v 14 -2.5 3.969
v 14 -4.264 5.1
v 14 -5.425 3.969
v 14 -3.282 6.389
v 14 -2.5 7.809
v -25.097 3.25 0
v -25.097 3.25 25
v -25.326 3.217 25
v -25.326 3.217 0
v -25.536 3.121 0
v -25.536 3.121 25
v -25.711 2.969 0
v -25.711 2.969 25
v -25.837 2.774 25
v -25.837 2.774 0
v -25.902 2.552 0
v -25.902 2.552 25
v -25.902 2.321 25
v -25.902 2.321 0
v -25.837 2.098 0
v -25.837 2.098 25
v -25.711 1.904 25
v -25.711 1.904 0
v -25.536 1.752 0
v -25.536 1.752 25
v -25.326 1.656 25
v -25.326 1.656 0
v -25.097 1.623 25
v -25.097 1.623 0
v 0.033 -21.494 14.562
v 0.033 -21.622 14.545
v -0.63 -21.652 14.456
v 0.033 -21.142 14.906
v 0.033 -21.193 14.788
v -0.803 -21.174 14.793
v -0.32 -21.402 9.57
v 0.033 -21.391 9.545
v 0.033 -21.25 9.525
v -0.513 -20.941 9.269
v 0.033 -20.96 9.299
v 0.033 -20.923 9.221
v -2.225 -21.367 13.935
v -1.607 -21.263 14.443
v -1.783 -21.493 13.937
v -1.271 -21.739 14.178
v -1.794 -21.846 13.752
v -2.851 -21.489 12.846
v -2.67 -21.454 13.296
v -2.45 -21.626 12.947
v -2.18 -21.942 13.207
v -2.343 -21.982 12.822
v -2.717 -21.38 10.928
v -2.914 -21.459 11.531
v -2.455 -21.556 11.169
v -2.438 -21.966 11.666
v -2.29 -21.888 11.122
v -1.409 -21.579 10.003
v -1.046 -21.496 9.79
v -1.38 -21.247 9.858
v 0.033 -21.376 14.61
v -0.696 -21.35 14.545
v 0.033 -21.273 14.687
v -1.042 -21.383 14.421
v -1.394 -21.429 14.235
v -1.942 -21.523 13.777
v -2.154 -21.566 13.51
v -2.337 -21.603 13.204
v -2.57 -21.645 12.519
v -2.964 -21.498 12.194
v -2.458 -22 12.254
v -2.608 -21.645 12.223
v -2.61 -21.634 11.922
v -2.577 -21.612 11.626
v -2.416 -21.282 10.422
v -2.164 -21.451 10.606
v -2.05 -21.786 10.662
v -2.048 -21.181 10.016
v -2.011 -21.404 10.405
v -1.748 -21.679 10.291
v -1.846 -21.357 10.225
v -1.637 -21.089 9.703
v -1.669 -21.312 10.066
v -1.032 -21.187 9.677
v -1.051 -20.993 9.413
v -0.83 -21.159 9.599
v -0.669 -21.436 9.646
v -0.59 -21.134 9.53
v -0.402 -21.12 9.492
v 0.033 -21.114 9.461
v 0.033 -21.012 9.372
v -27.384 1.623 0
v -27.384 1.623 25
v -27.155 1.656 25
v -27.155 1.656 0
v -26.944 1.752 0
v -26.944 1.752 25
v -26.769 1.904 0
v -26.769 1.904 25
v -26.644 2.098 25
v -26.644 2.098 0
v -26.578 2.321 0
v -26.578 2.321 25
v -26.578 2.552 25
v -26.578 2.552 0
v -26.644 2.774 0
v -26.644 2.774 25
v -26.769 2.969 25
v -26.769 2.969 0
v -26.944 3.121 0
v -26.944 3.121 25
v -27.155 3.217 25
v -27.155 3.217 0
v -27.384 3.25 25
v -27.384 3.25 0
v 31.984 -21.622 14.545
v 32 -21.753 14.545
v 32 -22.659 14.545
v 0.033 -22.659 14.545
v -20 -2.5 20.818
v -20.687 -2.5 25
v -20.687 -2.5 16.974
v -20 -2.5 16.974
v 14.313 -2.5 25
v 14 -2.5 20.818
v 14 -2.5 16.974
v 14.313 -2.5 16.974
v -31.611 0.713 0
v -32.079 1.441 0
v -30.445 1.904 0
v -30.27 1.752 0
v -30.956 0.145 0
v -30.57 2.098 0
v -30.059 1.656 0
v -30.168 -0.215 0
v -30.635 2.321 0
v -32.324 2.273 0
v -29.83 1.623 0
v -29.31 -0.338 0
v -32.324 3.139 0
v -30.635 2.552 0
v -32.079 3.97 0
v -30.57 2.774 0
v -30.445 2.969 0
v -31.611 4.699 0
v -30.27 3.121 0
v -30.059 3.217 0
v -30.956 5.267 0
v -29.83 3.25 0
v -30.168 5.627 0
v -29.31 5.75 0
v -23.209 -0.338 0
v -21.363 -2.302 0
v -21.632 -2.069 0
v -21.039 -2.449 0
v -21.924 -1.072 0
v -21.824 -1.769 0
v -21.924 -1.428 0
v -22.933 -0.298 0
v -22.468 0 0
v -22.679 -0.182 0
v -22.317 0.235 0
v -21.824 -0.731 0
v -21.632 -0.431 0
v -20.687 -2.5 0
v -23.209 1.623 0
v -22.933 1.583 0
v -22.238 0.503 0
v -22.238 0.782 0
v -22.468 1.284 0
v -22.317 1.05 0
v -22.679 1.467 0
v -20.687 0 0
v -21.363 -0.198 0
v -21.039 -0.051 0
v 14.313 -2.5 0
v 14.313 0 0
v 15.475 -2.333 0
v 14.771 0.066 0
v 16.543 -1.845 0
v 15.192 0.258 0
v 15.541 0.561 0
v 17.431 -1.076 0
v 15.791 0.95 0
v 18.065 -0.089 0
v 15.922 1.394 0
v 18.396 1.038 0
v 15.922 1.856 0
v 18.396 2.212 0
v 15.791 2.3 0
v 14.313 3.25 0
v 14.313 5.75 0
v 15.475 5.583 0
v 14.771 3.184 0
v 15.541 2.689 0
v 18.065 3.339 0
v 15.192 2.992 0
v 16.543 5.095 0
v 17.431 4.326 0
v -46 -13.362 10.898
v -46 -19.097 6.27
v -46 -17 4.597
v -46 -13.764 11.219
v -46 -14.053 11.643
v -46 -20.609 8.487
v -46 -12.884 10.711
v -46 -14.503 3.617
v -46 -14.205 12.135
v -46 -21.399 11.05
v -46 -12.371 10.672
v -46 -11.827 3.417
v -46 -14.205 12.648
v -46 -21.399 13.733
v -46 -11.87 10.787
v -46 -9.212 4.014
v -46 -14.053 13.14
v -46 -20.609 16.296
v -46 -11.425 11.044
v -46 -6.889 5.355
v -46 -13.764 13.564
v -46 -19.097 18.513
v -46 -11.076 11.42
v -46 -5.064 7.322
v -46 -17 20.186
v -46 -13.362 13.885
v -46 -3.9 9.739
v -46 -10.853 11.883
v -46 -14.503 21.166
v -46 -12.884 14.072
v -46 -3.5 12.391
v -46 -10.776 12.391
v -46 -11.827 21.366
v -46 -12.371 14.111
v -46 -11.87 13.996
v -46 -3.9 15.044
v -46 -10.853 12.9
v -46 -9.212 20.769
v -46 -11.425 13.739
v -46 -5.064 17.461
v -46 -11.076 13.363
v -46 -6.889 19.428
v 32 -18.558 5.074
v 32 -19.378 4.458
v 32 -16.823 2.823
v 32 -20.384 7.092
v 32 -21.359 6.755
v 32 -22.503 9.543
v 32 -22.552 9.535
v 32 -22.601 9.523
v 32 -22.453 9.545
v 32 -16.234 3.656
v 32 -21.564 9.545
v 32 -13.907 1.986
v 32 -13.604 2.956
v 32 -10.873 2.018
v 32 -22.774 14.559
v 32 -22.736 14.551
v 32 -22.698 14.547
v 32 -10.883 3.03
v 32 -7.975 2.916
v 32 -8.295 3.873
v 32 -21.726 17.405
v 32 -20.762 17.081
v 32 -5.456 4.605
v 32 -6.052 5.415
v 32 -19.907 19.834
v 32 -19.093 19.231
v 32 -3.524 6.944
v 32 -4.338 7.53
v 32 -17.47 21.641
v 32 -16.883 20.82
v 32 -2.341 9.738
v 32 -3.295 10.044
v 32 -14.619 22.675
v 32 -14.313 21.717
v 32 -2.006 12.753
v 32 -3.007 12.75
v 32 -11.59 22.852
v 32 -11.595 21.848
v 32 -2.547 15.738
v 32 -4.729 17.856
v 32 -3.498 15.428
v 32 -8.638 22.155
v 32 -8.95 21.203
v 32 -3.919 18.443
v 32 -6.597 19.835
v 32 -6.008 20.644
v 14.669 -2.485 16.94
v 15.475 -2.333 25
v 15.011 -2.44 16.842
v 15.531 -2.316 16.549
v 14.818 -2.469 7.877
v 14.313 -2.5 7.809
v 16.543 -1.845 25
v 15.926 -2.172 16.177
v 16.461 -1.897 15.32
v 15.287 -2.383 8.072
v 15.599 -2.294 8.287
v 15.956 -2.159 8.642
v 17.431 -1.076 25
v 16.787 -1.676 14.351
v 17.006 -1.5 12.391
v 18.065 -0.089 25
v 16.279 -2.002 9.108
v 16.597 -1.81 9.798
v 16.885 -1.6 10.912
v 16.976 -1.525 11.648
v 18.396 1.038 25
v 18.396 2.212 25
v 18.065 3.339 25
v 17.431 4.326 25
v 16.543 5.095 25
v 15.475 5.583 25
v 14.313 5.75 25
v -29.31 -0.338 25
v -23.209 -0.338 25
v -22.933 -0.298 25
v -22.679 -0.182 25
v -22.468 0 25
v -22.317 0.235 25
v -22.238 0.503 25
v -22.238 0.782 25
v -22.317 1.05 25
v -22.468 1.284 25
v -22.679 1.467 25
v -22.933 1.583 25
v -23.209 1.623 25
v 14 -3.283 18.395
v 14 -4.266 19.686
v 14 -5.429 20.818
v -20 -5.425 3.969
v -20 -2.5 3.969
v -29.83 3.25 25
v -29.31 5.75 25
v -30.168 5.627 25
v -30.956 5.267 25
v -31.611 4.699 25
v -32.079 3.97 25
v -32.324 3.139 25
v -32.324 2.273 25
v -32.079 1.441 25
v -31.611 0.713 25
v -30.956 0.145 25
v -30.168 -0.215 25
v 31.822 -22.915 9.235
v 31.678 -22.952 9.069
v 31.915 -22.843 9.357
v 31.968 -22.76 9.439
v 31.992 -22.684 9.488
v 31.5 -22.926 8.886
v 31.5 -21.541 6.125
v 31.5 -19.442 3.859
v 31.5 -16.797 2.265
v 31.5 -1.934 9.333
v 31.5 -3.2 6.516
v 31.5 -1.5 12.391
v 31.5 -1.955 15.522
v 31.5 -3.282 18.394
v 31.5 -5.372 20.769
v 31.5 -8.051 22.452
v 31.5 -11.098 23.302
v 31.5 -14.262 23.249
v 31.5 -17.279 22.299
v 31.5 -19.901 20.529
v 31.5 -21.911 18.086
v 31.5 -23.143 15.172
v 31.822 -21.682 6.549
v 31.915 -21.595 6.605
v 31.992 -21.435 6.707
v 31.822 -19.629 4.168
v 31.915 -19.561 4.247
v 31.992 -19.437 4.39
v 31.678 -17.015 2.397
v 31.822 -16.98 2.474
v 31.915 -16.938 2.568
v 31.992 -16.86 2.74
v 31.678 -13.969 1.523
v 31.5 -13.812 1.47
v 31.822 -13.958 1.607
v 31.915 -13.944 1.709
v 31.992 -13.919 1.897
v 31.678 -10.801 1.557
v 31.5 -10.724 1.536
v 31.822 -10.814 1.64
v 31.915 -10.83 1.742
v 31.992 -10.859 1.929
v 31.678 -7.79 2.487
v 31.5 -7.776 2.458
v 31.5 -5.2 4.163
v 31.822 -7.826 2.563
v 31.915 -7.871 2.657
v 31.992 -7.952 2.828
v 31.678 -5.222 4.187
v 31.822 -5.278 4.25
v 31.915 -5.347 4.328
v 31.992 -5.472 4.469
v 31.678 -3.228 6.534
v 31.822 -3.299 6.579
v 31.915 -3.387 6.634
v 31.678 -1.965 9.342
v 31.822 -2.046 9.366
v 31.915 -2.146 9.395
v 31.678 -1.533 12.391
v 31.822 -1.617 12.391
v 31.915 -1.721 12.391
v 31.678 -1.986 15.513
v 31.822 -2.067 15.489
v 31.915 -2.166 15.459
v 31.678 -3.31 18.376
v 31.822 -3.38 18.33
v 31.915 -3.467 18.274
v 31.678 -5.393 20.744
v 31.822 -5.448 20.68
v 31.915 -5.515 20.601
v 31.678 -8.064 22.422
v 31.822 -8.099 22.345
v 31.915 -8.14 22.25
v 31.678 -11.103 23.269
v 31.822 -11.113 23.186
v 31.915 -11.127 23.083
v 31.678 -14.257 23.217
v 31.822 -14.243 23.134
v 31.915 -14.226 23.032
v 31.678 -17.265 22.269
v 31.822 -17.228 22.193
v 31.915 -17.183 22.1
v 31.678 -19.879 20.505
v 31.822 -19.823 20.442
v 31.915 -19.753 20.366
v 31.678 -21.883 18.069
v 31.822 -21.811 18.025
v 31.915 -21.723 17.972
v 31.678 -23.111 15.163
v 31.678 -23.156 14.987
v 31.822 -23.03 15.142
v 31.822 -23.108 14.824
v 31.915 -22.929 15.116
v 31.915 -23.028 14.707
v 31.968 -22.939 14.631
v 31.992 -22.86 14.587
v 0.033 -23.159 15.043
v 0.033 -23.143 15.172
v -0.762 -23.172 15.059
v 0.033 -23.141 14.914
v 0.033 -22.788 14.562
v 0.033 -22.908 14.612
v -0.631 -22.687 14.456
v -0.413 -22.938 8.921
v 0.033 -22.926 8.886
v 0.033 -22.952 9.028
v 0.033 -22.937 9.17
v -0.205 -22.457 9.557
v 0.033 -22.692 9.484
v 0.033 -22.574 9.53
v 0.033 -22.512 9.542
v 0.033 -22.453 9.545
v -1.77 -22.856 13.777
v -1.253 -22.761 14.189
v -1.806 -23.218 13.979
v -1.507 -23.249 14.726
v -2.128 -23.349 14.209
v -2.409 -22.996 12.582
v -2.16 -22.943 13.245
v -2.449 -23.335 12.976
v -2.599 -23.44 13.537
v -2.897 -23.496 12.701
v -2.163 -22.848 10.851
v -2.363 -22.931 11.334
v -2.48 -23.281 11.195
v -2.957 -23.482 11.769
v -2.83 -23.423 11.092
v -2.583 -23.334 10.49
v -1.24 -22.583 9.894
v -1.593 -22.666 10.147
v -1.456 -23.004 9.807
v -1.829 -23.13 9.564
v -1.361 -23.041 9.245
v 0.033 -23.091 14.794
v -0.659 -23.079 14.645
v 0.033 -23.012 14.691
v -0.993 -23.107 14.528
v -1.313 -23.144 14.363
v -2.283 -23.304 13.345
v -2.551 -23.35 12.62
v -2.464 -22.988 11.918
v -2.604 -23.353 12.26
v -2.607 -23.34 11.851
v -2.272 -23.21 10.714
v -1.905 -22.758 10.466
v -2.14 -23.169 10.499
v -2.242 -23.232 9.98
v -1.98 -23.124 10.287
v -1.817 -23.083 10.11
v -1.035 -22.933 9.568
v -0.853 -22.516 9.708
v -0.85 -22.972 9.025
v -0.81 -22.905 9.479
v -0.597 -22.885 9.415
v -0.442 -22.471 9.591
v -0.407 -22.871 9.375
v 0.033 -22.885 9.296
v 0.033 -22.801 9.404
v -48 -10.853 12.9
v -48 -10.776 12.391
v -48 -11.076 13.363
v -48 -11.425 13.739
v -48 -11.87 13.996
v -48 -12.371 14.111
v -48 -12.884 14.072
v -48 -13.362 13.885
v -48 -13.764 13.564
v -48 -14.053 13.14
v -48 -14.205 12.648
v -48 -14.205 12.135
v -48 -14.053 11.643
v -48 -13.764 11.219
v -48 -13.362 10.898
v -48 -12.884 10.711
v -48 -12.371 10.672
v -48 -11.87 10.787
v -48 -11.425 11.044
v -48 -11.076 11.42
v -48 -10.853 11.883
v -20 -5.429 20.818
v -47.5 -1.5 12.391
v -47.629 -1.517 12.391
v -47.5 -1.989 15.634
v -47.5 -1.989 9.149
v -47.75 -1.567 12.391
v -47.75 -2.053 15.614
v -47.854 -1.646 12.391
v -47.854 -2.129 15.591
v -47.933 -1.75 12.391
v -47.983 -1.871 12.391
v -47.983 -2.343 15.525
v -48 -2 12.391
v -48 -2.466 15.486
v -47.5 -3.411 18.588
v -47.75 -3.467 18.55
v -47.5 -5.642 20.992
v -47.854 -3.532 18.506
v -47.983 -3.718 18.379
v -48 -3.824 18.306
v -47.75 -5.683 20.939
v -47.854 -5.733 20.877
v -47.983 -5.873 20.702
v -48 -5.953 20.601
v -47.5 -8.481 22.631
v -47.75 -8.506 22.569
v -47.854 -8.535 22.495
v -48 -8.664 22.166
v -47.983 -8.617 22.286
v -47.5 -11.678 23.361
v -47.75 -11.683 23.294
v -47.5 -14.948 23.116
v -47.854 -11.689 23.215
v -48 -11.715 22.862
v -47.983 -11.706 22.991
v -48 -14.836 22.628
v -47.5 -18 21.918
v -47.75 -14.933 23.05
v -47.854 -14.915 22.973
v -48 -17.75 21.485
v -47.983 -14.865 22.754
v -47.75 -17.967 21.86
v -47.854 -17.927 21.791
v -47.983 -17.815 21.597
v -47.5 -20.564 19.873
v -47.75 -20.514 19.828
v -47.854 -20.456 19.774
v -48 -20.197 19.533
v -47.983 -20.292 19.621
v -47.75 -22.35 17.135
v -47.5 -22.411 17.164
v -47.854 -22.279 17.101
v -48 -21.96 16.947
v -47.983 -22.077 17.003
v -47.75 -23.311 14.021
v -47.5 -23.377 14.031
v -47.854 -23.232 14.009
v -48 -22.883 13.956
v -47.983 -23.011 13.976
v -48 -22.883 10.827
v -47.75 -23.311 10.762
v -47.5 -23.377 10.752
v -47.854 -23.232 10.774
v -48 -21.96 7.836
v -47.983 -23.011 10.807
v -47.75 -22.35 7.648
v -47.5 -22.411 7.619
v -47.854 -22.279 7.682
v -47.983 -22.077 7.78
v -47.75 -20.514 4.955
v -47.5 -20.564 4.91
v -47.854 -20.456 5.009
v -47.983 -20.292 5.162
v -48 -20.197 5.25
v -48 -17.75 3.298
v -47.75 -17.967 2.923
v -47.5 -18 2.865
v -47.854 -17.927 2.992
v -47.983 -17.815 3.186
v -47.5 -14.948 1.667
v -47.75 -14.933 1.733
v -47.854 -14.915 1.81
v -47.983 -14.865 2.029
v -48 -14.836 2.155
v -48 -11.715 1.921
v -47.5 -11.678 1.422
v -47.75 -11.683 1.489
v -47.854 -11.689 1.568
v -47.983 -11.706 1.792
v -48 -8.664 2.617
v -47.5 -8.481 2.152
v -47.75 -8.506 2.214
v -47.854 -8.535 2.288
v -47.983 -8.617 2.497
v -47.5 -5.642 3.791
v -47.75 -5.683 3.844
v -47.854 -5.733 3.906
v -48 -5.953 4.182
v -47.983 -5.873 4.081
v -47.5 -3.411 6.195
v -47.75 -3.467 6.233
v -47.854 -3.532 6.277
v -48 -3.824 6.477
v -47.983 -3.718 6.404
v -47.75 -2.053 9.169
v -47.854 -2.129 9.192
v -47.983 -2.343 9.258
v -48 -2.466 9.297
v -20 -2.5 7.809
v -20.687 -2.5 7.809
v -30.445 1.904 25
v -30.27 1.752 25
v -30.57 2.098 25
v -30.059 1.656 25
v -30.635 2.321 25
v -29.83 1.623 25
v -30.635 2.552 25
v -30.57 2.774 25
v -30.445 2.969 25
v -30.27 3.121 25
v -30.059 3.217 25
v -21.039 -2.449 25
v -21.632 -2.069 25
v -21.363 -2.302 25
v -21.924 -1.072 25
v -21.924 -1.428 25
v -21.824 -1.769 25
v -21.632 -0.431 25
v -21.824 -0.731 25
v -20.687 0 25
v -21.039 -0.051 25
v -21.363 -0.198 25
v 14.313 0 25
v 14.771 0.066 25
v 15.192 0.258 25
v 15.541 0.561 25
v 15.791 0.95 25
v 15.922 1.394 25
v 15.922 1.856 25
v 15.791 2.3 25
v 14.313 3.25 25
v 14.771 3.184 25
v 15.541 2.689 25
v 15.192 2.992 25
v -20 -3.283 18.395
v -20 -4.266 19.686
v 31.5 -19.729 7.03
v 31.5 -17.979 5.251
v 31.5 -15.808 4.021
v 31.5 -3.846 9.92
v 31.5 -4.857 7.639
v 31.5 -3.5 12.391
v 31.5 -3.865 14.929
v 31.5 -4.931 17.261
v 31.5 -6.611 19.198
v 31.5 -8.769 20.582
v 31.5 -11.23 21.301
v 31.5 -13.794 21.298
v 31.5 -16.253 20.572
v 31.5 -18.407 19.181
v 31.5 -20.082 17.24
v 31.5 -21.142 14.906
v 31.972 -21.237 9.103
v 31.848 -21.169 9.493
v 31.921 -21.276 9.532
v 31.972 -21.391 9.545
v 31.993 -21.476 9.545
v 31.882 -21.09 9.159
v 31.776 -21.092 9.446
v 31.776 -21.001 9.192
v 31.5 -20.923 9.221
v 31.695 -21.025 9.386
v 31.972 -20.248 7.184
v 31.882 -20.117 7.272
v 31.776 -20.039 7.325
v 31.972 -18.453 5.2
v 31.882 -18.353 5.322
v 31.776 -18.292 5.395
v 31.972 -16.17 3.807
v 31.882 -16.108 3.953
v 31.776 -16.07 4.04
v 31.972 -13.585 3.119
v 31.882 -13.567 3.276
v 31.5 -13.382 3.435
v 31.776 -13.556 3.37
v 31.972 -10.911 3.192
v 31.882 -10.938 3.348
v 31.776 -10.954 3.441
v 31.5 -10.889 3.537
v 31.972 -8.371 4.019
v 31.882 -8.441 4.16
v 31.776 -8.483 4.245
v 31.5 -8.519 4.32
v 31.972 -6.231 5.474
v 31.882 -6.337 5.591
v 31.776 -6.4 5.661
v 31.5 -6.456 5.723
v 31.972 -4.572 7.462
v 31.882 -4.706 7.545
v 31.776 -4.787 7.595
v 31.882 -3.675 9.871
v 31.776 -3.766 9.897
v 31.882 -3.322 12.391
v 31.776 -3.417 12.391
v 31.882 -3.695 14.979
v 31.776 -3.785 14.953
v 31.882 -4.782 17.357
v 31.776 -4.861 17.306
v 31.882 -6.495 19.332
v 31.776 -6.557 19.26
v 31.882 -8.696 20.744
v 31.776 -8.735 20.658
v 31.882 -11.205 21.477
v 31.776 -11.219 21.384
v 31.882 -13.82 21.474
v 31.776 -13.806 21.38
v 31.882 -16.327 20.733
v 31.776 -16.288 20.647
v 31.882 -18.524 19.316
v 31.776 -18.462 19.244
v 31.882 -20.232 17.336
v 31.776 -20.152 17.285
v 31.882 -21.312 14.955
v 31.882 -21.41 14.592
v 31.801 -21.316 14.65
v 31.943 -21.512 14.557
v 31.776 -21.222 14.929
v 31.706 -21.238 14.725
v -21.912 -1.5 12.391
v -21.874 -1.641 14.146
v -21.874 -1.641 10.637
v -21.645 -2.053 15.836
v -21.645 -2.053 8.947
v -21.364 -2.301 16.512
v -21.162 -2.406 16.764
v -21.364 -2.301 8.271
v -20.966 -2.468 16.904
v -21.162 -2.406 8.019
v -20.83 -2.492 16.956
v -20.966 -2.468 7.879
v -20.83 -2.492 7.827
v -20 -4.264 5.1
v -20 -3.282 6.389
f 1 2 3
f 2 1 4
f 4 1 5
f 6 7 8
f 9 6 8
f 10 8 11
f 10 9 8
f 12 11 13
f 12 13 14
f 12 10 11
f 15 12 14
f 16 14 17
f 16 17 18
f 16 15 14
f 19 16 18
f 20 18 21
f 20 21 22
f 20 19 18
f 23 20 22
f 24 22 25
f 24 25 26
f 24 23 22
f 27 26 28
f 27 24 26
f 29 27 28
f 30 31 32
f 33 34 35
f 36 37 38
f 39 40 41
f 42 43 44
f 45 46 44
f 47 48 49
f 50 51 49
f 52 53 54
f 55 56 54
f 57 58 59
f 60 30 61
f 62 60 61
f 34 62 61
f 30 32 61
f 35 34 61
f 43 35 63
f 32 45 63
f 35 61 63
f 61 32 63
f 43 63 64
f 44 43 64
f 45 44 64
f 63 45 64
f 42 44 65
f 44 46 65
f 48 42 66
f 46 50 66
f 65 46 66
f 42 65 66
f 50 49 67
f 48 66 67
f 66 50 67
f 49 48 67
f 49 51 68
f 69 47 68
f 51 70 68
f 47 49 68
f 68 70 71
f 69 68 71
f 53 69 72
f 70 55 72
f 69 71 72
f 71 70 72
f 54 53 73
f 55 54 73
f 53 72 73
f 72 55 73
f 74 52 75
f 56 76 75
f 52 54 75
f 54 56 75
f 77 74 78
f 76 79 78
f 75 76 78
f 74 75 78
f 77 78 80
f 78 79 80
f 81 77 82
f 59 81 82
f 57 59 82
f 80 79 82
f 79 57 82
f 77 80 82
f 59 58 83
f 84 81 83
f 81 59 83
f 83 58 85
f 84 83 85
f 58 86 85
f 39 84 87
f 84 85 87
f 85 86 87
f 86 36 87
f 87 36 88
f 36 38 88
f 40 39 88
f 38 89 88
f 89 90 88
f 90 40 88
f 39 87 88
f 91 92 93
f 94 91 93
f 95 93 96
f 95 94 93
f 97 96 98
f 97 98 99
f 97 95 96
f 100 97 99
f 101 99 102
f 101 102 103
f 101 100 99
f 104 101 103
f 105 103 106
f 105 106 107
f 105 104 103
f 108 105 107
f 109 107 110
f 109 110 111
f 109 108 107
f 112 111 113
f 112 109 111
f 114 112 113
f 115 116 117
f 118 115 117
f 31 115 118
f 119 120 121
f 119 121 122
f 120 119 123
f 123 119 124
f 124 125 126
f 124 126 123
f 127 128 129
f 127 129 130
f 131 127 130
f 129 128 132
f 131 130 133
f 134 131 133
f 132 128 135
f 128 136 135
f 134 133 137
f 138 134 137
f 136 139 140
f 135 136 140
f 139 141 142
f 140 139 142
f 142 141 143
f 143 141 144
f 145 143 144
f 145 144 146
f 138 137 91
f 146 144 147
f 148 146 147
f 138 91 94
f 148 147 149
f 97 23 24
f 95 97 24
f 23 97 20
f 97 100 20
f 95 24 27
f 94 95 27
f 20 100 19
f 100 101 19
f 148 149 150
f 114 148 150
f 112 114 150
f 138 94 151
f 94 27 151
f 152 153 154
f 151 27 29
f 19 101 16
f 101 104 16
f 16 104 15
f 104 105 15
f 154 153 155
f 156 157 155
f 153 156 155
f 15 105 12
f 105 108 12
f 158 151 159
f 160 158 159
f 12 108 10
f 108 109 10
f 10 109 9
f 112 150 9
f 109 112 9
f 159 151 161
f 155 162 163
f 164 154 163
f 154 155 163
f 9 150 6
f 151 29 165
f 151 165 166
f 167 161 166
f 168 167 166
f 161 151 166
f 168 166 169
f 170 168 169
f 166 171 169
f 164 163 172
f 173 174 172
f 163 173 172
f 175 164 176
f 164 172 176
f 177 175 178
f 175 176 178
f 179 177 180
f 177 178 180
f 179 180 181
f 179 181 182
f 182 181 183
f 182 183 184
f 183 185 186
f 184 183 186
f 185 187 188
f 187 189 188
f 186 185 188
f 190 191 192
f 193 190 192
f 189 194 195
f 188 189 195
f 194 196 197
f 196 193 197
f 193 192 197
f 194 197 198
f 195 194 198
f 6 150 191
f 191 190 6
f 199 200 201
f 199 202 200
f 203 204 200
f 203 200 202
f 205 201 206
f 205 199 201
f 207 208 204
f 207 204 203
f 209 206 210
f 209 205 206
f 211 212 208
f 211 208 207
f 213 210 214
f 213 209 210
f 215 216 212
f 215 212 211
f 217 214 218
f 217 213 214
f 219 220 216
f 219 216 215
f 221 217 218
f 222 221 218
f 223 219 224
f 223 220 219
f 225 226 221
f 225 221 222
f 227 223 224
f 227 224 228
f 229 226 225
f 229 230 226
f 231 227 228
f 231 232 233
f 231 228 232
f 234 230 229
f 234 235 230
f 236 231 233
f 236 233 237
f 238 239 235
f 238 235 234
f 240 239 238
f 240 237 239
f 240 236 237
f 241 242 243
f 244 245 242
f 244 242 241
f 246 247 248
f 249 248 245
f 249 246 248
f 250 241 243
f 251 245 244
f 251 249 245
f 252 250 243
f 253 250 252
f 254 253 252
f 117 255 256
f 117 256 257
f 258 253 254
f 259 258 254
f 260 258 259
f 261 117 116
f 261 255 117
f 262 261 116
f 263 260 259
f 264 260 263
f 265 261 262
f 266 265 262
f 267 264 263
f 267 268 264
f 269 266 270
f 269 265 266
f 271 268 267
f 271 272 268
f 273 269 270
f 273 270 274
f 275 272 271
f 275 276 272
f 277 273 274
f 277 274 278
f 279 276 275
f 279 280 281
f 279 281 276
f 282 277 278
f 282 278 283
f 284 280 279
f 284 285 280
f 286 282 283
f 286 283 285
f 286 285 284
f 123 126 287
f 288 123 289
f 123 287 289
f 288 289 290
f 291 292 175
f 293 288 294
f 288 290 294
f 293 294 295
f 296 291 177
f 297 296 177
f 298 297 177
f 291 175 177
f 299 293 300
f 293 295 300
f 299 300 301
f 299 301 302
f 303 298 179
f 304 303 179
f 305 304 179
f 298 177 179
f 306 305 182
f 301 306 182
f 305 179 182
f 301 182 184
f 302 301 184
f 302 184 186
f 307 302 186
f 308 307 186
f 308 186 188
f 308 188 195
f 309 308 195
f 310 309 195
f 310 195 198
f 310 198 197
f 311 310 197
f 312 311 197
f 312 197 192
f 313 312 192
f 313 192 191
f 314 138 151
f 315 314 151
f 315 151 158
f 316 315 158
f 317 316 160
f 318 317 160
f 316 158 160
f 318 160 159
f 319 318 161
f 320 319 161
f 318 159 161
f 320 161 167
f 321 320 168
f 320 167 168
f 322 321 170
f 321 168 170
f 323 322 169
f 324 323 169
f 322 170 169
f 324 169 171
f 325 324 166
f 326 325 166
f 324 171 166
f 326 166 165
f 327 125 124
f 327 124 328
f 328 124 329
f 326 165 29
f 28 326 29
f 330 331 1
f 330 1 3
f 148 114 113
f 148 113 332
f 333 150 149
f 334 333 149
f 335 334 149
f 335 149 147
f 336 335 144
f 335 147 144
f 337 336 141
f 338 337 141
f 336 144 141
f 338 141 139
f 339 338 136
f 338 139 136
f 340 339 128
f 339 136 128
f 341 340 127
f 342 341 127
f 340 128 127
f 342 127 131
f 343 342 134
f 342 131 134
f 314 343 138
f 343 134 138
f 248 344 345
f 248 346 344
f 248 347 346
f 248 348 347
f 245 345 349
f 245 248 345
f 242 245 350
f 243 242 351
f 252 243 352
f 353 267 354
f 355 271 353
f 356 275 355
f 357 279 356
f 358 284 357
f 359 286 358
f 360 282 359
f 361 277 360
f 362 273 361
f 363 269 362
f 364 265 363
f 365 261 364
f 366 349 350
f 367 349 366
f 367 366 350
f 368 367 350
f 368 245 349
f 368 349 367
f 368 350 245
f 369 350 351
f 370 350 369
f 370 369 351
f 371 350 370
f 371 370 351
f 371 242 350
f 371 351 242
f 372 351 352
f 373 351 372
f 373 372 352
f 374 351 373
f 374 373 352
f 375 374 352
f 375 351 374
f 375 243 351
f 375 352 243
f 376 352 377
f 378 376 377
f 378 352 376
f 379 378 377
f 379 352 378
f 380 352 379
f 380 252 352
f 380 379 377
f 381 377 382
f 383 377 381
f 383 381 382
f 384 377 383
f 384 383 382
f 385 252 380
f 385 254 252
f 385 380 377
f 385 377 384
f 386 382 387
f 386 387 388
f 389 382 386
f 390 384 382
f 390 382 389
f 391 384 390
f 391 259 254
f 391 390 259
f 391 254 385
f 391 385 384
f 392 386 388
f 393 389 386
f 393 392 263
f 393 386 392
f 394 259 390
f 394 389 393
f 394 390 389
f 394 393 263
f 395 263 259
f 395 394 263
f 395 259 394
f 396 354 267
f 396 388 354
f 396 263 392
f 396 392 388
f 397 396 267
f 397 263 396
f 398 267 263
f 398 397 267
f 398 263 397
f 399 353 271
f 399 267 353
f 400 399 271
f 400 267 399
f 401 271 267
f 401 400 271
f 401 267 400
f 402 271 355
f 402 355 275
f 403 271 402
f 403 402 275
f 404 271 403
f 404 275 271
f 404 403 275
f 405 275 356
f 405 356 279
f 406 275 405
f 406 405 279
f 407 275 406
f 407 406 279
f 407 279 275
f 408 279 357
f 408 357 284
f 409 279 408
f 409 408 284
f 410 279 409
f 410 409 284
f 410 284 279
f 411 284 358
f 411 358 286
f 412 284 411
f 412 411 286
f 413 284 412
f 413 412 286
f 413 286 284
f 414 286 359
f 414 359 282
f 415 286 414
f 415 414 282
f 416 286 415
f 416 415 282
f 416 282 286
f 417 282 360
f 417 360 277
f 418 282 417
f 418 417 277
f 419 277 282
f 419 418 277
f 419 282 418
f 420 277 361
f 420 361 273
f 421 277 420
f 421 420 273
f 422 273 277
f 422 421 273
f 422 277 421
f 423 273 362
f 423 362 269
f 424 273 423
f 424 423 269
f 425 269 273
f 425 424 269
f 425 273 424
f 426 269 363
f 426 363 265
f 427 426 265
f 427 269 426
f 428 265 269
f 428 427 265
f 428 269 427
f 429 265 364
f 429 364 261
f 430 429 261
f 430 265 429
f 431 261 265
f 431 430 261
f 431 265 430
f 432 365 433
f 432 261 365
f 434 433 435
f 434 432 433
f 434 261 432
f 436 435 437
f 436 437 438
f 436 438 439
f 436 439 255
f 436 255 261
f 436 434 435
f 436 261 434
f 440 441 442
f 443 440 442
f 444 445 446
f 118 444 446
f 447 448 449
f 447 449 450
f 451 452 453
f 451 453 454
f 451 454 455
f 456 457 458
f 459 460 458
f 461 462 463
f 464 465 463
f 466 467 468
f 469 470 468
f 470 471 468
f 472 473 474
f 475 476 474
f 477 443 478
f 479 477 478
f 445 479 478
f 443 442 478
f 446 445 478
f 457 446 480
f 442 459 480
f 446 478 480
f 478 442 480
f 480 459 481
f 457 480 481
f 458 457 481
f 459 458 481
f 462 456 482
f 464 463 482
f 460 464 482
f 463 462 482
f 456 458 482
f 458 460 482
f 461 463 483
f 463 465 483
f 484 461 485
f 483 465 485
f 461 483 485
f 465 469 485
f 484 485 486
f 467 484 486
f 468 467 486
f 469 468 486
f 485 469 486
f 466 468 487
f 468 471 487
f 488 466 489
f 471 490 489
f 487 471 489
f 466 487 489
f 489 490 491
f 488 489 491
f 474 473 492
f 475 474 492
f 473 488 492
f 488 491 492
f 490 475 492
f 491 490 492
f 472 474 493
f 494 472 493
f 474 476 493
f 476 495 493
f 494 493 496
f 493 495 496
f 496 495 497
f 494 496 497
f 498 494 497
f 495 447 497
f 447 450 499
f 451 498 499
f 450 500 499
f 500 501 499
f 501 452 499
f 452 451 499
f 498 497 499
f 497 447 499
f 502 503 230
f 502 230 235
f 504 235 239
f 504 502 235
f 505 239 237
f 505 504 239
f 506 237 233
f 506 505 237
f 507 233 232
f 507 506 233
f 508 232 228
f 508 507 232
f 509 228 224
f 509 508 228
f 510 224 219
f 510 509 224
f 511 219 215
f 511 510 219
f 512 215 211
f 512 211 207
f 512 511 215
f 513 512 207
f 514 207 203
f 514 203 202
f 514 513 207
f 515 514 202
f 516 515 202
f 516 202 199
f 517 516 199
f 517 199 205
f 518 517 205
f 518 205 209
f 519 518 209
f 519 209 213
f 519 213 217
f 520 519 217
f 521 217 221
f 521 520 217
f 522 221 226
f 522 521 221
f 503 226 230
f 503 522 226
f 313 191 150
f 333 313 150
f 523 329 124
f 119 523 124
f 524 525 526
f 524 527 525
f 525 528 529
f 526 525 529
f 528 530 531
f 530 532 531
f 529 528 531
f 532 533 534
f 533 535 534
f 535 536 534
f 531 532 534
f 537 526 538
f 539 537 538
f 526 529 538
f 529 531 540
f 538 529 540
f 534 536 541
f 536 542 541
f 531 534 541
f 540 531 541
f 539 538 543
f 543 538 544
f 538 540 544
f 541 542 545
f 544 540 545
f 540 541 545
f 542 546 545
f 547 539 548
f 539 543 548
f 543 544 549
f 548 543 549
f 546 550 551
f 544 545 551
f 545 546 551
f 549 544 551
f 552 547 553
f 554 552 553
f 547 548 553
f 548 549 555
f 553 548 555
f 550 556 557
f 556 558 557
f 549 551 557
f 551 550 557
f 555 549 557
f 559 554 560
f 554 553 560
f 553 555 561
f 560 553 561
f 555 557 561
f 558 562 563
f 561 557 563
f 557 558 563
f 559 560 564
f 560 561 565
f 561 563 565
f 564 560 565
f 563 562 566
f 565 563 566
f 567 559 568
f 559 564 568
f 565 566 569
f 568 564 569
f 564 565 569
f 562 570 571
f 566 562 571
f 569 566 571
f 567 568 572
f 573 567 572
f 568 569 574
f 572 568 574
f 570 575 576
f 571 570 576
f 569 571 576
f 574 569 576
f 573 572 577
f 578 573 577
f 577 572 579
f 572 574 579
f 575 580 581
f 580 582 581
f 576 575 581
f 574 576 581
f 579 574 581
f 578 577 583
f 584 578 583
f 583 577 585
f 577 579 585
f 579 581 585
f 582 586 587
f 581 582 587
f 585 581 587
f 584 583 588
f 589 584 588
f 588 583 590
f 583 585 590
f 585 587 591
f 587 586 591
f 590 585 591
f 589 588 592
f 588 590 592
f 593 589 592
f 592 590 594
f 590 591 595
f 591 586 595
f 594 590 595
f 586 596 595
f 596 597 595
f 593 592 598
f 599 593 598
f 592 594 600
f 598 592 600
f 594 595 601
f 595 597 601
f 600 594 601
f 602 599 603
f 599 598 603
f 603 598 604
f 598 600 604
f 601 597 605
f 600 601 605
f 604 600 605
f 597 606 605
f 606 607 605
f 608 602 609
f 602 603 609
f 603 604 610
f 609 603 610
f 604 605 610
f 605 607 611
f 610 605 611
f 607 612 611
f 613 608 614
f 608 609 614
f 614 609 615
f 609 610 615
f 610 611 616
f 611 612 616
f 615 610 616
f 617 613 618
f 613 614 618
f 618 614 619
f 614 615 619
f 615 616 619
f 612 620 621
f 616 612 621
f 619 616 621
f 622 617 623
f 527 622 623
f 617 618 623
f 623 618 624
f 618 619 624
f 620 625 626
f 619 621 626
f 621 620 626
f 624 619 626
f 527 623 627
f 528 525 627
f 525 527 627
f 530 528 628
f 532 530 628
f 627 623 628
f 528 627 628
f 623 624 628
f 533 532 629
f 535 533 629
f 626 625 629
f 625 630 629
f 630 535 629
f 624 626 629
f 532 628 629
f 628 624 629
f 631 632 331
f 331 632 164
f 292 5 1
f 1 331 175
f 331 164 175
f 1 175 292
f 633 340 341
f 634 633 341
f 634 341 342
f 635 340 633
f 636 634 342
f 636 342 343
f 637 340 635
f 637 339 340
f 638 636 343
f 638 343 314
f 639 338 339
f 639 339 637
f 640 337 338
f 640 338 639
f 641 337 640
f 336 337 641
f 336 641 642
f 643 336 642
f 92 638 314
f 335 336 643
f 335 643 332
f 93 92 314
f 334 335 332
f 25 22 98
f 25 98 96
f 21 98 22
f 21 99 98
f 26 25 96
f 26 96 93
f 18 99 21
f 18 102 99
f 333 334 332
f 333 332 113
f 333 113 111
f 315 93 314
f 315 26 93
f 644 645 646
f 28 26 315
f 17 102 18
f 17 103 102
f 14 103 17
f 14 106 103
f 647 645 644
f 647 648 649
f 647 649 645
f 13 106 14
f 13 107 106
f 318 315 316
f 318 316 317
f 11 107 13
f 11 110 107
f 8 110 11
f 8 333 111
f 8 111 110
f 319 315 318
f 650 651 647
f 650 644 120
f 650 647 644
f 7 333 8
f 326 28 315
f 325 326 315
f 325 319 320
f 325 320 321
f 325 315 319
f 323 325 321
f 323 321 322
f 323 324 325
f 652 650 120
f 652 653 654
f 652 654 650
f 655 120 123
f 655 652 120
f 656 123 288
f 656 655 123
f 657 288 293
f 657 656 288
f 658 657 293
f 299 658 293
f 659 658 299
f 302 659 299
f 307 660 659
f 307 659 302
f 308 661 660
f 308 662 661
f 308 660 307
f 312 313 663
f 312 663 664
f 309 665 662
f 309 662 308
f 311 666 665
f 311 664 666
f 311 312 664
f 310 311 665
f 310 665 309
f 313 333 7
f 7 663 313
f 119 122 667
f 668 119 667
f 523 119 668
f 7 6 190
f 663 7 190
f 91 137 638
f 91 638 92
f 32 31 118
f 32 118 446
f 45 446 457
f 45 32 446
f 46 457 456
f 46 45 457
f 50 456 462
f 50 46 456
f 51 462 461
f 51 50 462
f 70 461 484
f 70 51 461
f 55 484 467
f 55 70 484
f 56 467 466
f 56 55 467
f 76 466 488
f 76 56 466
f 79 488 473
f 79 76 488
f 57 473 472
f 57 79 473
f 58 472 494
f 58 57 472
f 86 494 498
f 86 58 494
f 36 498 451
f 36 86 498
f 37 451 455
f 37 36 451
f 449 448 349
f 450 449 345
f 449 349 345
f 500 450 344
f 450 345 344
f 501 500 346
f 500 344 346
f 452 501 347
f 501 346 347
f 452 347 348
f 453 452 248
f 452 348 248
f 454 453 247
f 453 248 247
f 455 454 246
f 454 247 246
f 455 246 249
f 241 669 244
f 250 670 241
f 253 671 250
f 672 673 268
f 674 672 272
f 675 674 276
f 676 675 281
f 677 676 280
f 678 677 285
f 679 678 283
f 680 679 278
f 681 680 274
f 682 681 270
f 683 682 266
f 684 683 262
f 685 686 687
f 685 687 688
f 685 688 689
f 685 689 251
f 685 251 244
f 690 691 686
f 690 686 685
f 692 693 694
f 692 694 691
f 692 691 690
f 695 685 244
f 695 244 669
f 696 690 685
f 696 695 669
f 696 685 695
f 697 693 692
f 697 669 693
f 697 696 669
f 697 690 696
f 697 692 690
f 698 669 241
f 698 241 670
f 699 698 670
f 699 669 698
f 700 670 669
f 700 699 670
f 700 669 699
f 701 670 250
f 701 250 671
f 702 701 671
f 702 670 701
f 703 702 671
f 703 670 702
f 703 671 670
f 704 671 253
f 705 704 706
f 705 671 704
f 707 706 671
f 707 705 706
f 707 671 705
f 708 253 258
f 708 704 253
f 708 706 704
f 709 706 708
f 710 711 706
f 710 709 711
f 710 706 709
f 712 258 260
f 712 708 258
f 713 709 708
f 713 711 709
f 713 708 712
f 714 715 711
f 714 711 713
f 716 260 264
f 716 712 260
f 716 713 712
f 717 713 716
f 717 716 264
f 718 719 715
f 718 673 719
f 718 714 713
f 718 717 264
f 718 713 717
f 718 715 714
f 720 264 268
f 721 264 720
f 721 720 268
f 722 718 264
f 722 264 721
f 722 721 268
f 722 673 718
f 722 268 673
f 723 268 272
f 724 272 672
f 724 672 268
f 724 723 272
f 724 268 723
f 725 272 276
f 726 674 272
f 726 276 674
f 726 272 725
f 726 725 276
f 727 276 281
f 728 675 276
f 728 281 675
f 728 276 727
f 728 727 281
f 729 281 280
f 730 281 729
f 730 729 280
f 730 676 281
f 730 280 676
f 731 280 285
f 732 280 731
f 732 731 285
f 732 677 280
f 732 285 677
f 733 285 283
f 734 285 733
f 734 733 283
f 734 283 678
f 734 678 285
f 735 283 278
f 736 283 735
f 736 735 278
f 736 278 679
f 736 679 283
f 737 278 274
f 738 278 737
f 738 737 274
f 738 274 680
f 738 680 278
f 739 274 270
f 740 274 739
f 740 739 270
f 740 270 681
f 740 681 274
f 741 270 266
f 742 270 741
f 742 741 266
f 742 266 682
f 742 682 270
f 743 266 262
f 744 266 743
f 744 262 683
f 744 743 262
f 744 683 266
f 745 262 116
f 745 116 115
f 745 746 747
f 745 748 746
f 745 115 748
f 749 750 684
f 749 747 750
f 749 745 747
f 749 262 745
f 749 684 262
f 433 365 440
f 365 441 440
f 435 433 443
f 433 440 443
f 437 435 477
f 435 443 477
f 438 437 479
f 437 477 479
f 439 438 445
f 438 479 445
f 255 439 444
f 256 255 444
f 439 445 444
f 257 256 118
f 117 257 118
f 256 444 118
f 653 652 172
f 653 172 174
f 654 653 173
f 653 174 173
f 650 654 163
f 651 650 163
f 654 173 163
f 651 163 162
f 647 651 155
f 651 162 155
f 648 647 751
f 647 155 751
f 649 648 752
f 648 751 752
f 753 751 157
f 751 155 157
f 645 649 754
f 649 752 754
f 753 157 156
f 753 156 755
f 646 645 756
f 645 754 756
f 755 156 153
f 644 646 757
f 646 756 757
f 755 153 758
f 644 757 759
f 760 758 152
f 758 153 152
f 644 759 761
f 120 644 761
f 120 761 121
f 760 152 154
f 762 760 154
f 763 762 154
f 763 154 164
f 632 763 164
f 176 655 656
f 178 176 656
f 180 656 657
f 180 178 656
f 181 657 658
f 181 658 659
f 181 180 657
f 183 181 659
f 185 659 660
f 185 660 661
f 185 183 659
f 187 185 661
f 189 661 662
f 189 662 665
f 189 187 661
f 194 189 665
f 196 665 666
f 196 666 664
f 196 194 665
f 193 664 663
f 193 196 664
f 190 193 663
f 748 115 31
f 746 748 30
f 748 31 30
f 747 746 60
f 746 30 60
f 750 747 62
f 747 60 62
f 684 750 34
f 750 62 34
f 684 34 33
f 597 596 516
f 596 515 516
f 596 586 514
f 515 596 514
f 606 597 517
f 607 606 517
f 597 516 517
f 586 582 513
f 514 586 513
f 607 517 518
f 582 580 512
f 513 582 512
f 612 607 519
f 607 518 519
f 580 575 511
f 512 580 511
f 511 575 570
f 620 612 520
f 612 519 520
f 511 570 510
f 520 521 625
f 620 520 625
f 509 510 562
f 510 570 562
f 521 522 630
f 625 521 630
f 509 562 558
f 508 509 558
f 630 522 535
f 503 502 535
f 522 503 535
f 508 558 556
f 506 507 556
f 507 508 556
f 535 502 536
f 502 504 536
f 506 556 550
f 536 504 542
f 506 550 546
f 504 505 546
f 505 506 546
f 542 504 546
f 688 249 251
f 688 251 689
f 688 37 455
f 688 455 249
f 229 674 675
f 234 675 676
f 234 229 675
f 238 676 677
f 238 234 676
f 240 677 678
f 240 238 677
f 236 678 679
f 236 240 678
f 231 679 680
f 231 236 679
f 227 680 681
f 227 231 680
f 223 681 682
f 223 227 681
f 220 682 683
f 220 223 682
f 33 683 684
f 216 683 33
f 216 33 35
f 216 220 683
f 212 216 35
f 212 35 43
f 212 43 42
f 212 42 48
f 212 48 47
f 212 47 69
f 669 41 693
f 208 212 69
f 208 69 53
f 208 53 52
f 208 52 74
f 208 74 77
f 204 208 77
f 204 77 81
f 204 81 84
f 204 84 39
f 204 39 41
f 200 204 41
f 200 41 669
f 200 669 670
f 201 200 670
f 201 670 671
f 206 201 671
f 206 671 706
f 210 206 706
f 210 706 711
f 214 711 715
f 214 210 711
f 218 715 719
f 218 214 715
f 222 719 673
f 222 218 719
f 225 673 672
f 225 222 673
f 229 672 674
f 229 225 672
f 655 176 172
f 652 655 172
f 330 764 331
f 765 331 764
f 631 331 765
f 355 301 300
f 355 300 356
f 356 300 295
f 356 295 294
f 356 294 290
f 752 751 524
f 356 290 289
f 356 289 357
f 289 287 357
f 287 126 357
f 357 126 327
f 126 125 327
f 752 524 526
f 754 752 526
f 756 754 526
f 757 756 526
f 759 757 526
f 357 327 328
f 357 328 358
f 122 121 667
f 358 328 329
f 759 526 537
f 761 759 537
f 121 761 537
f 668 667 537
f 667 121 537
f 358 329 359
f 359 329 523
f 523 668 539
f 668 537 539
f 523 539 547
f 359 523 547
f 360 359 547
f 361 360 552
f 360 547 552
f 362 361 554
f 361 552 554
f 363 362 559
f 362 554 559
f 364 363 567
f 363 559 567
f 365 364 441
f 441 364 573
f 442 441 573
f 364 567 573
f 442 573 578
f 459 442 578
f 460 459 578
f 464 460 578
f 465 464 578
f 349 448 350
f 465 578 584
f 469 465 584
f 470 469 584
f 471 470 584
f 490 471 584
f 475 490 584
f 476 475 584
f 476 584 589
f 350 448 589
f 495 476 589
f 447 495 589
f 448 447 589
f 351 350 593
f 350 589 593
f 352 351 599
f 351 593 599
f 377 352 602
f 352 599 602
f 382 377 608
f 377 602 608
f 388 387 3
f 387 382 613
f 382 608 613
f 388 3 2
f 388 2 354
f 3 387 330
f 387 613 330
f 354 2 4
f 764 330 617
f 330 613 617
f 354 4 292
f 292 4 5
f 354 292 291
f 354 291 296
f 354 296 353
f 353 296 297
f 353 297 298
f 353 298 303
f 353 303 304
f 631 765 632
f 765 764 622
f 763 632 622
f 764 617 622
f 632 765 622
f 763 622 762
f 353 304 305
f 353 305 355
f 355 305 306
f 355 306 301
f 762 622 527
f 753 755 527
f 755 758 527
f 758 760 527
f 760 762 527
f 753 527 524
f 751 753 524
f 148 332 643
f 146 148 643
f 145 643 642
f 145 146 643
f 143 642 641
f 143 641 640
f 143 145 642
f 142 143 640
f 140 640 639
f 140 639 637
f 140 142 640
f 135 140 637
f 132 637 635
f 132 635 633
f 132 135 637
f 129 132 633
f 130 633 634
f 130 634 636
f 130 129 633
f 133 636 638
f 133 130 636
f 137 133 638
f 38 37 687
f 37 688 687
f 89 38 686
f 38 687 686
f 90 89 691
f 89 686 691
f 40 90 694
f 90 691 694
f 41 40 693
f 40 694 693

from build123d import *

# Parameters (mm, degrees)
PAD_DEPTH     = 25
SKETCH001_R   = 11
SKETCH001_R_2 = 9
PAD001_DEPTH  = 80
SKETCH003_R   = 11
SKETCH003_R_2 = 1.724065
PAD003_DEPTH  = 2
POCKET_DEPTH  = 5
PAD004_DEPTH  = 34
FILLET_R      = 0.5


with BuildPart() as part:
    # Sketch → Pad (new body)
    with BuildSketch(Plane.XY):
        with BuildLine():
            Line((-20.68693, -2.5), (14.31307, -2.5))
            ThreePointArc((14.31307, -2.5), (18.43807, 1.625), (14.31307, 5.75))
            Line((14.31307, 5.75), (-29.310484, 5.75))
            ThreePointArc((-29.310484, 5.75), (-32.354525, 2.705959), (-29.310484, -0.338083))
            Line((-29.310484, -0.338083), (-23.208912, -0.338083))
            ThreePointArc((-23.208912, -0.338083), (-22.228438, 0.642392), (-23.208912, 1.622866))
            Line((-23.208912, 1.622866), (-25.096558, 1.622866))
            ThreePointArc((-25.096558, 3.25), (-25.910125, 2.436433), (-25.096558, 1.622866))
            Line((-25.096558, 3.25), (-23.043861, 3.25))
            Line((-23.043861, 3.25), (14.31307, 3.25))
            ThreePointArc((14.31307, 0), (15.93807, 1.625), (14.31307, 3.25))
            Line((14.31307, 0), (-20.68693, 0))
            ThreePointArc((-20.68693, 0), (-21.93693, -1.25), (-20.68693, -2.5))
        make_face()
        with BuildLine():
            ThreePointArc((-29.829905, 3.25), (-30.643472, 2.436433), (-29.829905, 1.622866))
            Line((-29.829905, 1.622866), (-27.383743, 1.622866))
            ThreePointArc((-27.383743, 1.622866), (-26.570176, 2.436433), (-27.383743, 3.25))
            Line((-27.383743, 3.25), (-29.829905, 3.25))
        make_face(mode=Mode.SUBTRACT)
    extrude(amount=PAD_DEPTH)

    # Sketch001 → Pad001 (join)
    with BuildSketch(Plane.YZ.offset(-48)):
        with Locations((-12.5, 12.391484)):
            Circle(SKETCH001_R)
        with Locations((-12.5, 12.391484)):
            Circle(SKETCH001_R_2, mode=Mode.SUBTRACT)
    extrude(amount=PAD001_DEPTH)

    # Sketch003 → Pad003 (join)
    with BuildSketch(Plane.YZ.offset(-48)):
        with Locations((-12.5, 12.391484)):
            Circle(SKETCH003_R)
        with Locations((-12.5, 12.391484)):
            Circle(SKETCH003_R_2, mode=Mode.SUBTRACT)
    extrude(amount=PAD003_DEPTH)

    # Sketch004 → Pocket (cut)
    with BuildSketch(Plane.XZ.offset(20)):
        with BuildLine():
            ThreePointArc((39.088972, 9.545273), (41.588972, 12.045273), (39.088972, 14.545273))
            Line((39.088972, 14.545273), (0.033153, 14.545273))
            ThreePointArc((0.033153, 14.545273), (-2.466847, 12.045273), (0.033153, 9.545273))
            Line((0.033153, 9.545273), (39.088972, 9.545273))
        make_face()
    extrude(amount=POCKET_DEPTH, mode=Mode.SUBTRACT)

    # Sketch002 → Pad004 (join)
    with BuildSketch(Plane.YZ.offset(-20)):
        Polygon((-6.18094, 20.817627), (-1.15394, 20.817627), (-1.15394, 15.631813), (-3.60294, 15.631813), (-6.18094, 19.960645), align=None)
        Polygon((-3.60294, 9.154813), (-1.15394, 9.154813), (-1.15394, 3.969), (-6.18094, 3.969), (-6.18094, 4.825982), align=None)
    extrude(amount=PAD004_DEPTH)

    # Fillet
    fillet_edges = [part.edges().sort_by_distance(p)[0] for p in [
        (32, -11.417857, 23.338126),
        (32, -11.415197, 21.325867),
        (16.016576, -23.287085, 14.545273),
        (-2.46684, -23.494353, 12.039074),
        (16.016576, -23.125398, 9.545273),
        (16.016576, -21.238489, 14.545273),
        (-2.466829, -21.49297, 12.035825),
        (16.016576, -21.038096, 9.545273),
        (-48, -23.5, 12.391484),
    ]]
    fillet(fillet_edges, radius=FILLET_R)


solid = part.part
